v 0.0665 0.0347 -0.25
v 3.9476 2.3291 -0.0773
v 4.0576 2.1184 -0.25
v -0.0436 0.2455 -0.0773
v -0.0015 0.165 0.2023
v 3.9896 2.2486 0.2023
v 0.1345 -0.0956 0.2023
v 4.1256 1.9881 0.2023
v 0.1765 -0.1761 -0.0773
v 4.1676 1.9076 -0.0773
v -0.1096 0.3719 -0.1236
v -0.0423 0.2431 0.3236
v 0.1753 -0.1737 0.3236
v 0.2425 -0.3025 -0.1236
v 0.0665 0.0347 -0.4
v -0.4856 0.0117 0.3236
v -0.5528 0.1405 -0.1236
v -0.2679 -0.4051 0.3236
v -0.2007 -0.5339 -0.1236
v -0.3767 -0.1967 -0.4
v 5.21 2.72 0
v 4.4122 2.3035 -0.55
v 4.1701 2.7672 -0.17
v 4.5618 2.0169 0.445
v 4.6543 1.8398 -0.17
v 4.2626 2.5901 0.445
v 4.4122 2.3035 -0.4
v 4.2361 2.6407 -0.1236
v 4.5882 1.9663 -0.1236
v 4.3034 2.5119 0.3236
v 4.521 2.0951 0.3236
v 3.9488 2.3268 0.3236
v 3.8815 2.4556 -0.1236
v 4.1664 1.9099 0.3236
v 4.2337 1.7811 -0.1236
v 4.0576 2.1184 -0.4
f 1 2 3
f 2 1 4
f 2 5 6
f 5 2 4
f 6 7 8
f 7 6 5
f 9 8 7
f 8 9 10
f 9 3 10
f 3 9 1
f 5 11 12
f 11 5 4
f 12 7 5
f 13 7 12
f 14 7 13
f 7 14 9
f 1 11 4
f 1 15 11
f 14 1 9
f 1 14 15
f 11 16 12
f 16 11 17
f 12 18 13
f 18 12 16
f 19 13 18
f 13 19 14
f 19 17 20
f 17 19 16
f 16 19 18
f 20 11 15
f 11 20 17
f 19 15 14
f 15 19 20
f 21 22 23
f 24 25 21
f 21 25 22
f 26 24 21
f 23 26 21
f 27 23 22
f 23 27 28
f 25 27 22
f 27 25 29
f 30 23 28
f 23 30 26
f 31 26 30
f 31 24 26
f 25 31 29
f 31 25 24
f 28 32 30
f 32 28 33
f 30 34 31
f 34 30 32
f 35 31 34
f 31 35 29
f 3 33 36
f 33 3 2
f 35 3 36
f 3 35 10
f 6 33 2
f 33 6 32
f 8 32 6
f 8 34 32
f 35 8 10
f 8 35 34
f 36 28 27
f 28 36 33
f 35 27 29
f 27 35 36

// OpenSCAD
// Axial reference: vector [5.21, 2.72, 0]
// One connected solid, no text, oriented along the given vector in the XY plane.

module axial_reference(v = [5.21, 2.72, 0]) {
    // Geometry parameters (scaled up slightly to avoid "blank" renders from too-thin features)
    rod_r   = 0.25;
    tip_len = 0.90;
    tip_r   = 0.55;
    cap_r   = 0.40;
    cap_h   = 0.45;
    overlap = 0.05;

    L = max(norm(v), 0.001);
    ang = atan2(v[1], v[0]);

    // Build arrow along +X (easier: no 90° remap needed), then rotate in XY by ang.
    module arrow_along_x() {
        union() {
            // Main rod from x=0 to x=L-tip_len (with overlap into tip)
            translate([ (L - tip_len + overlap)/2, 0, 0 ])
                rotate([0, 90, 0])
                    cylinder(h = max(L - tip_len + overlap, 0.001), r = rod_r, center = true);

            // Base cap at x=0 (overlaps rod)
            translate([ -cap_h/2 + overlap, 0, 0 ])
                rotate([0, 90, 0])
                    cylinder(h = cap_h + overlap, r = cap_r, center = true);

            // Tip (cone) from x=L-tip_len to x=L (overlaps rod)
            translate([ L - tip_len, 0, 0 ])
                rotate([0, 90, 0])
                    cylinder(h = tip_len, r1 = tip_r, r2 = 0, center = false);

            // Collar ring just before tip (overlaps rod/tip junction)
            translate([ L - tip_len - cap_h/2 + overlap, 0, 0 ])
                rotate([0, 90, 0])
                    cylinder(h = cap_h, r = cap_r, center = true);
        }
    }

    rotate([0, 0, ang]) arrow_along_x();
}

axial_reference([5.21, 2.72, 0]);
